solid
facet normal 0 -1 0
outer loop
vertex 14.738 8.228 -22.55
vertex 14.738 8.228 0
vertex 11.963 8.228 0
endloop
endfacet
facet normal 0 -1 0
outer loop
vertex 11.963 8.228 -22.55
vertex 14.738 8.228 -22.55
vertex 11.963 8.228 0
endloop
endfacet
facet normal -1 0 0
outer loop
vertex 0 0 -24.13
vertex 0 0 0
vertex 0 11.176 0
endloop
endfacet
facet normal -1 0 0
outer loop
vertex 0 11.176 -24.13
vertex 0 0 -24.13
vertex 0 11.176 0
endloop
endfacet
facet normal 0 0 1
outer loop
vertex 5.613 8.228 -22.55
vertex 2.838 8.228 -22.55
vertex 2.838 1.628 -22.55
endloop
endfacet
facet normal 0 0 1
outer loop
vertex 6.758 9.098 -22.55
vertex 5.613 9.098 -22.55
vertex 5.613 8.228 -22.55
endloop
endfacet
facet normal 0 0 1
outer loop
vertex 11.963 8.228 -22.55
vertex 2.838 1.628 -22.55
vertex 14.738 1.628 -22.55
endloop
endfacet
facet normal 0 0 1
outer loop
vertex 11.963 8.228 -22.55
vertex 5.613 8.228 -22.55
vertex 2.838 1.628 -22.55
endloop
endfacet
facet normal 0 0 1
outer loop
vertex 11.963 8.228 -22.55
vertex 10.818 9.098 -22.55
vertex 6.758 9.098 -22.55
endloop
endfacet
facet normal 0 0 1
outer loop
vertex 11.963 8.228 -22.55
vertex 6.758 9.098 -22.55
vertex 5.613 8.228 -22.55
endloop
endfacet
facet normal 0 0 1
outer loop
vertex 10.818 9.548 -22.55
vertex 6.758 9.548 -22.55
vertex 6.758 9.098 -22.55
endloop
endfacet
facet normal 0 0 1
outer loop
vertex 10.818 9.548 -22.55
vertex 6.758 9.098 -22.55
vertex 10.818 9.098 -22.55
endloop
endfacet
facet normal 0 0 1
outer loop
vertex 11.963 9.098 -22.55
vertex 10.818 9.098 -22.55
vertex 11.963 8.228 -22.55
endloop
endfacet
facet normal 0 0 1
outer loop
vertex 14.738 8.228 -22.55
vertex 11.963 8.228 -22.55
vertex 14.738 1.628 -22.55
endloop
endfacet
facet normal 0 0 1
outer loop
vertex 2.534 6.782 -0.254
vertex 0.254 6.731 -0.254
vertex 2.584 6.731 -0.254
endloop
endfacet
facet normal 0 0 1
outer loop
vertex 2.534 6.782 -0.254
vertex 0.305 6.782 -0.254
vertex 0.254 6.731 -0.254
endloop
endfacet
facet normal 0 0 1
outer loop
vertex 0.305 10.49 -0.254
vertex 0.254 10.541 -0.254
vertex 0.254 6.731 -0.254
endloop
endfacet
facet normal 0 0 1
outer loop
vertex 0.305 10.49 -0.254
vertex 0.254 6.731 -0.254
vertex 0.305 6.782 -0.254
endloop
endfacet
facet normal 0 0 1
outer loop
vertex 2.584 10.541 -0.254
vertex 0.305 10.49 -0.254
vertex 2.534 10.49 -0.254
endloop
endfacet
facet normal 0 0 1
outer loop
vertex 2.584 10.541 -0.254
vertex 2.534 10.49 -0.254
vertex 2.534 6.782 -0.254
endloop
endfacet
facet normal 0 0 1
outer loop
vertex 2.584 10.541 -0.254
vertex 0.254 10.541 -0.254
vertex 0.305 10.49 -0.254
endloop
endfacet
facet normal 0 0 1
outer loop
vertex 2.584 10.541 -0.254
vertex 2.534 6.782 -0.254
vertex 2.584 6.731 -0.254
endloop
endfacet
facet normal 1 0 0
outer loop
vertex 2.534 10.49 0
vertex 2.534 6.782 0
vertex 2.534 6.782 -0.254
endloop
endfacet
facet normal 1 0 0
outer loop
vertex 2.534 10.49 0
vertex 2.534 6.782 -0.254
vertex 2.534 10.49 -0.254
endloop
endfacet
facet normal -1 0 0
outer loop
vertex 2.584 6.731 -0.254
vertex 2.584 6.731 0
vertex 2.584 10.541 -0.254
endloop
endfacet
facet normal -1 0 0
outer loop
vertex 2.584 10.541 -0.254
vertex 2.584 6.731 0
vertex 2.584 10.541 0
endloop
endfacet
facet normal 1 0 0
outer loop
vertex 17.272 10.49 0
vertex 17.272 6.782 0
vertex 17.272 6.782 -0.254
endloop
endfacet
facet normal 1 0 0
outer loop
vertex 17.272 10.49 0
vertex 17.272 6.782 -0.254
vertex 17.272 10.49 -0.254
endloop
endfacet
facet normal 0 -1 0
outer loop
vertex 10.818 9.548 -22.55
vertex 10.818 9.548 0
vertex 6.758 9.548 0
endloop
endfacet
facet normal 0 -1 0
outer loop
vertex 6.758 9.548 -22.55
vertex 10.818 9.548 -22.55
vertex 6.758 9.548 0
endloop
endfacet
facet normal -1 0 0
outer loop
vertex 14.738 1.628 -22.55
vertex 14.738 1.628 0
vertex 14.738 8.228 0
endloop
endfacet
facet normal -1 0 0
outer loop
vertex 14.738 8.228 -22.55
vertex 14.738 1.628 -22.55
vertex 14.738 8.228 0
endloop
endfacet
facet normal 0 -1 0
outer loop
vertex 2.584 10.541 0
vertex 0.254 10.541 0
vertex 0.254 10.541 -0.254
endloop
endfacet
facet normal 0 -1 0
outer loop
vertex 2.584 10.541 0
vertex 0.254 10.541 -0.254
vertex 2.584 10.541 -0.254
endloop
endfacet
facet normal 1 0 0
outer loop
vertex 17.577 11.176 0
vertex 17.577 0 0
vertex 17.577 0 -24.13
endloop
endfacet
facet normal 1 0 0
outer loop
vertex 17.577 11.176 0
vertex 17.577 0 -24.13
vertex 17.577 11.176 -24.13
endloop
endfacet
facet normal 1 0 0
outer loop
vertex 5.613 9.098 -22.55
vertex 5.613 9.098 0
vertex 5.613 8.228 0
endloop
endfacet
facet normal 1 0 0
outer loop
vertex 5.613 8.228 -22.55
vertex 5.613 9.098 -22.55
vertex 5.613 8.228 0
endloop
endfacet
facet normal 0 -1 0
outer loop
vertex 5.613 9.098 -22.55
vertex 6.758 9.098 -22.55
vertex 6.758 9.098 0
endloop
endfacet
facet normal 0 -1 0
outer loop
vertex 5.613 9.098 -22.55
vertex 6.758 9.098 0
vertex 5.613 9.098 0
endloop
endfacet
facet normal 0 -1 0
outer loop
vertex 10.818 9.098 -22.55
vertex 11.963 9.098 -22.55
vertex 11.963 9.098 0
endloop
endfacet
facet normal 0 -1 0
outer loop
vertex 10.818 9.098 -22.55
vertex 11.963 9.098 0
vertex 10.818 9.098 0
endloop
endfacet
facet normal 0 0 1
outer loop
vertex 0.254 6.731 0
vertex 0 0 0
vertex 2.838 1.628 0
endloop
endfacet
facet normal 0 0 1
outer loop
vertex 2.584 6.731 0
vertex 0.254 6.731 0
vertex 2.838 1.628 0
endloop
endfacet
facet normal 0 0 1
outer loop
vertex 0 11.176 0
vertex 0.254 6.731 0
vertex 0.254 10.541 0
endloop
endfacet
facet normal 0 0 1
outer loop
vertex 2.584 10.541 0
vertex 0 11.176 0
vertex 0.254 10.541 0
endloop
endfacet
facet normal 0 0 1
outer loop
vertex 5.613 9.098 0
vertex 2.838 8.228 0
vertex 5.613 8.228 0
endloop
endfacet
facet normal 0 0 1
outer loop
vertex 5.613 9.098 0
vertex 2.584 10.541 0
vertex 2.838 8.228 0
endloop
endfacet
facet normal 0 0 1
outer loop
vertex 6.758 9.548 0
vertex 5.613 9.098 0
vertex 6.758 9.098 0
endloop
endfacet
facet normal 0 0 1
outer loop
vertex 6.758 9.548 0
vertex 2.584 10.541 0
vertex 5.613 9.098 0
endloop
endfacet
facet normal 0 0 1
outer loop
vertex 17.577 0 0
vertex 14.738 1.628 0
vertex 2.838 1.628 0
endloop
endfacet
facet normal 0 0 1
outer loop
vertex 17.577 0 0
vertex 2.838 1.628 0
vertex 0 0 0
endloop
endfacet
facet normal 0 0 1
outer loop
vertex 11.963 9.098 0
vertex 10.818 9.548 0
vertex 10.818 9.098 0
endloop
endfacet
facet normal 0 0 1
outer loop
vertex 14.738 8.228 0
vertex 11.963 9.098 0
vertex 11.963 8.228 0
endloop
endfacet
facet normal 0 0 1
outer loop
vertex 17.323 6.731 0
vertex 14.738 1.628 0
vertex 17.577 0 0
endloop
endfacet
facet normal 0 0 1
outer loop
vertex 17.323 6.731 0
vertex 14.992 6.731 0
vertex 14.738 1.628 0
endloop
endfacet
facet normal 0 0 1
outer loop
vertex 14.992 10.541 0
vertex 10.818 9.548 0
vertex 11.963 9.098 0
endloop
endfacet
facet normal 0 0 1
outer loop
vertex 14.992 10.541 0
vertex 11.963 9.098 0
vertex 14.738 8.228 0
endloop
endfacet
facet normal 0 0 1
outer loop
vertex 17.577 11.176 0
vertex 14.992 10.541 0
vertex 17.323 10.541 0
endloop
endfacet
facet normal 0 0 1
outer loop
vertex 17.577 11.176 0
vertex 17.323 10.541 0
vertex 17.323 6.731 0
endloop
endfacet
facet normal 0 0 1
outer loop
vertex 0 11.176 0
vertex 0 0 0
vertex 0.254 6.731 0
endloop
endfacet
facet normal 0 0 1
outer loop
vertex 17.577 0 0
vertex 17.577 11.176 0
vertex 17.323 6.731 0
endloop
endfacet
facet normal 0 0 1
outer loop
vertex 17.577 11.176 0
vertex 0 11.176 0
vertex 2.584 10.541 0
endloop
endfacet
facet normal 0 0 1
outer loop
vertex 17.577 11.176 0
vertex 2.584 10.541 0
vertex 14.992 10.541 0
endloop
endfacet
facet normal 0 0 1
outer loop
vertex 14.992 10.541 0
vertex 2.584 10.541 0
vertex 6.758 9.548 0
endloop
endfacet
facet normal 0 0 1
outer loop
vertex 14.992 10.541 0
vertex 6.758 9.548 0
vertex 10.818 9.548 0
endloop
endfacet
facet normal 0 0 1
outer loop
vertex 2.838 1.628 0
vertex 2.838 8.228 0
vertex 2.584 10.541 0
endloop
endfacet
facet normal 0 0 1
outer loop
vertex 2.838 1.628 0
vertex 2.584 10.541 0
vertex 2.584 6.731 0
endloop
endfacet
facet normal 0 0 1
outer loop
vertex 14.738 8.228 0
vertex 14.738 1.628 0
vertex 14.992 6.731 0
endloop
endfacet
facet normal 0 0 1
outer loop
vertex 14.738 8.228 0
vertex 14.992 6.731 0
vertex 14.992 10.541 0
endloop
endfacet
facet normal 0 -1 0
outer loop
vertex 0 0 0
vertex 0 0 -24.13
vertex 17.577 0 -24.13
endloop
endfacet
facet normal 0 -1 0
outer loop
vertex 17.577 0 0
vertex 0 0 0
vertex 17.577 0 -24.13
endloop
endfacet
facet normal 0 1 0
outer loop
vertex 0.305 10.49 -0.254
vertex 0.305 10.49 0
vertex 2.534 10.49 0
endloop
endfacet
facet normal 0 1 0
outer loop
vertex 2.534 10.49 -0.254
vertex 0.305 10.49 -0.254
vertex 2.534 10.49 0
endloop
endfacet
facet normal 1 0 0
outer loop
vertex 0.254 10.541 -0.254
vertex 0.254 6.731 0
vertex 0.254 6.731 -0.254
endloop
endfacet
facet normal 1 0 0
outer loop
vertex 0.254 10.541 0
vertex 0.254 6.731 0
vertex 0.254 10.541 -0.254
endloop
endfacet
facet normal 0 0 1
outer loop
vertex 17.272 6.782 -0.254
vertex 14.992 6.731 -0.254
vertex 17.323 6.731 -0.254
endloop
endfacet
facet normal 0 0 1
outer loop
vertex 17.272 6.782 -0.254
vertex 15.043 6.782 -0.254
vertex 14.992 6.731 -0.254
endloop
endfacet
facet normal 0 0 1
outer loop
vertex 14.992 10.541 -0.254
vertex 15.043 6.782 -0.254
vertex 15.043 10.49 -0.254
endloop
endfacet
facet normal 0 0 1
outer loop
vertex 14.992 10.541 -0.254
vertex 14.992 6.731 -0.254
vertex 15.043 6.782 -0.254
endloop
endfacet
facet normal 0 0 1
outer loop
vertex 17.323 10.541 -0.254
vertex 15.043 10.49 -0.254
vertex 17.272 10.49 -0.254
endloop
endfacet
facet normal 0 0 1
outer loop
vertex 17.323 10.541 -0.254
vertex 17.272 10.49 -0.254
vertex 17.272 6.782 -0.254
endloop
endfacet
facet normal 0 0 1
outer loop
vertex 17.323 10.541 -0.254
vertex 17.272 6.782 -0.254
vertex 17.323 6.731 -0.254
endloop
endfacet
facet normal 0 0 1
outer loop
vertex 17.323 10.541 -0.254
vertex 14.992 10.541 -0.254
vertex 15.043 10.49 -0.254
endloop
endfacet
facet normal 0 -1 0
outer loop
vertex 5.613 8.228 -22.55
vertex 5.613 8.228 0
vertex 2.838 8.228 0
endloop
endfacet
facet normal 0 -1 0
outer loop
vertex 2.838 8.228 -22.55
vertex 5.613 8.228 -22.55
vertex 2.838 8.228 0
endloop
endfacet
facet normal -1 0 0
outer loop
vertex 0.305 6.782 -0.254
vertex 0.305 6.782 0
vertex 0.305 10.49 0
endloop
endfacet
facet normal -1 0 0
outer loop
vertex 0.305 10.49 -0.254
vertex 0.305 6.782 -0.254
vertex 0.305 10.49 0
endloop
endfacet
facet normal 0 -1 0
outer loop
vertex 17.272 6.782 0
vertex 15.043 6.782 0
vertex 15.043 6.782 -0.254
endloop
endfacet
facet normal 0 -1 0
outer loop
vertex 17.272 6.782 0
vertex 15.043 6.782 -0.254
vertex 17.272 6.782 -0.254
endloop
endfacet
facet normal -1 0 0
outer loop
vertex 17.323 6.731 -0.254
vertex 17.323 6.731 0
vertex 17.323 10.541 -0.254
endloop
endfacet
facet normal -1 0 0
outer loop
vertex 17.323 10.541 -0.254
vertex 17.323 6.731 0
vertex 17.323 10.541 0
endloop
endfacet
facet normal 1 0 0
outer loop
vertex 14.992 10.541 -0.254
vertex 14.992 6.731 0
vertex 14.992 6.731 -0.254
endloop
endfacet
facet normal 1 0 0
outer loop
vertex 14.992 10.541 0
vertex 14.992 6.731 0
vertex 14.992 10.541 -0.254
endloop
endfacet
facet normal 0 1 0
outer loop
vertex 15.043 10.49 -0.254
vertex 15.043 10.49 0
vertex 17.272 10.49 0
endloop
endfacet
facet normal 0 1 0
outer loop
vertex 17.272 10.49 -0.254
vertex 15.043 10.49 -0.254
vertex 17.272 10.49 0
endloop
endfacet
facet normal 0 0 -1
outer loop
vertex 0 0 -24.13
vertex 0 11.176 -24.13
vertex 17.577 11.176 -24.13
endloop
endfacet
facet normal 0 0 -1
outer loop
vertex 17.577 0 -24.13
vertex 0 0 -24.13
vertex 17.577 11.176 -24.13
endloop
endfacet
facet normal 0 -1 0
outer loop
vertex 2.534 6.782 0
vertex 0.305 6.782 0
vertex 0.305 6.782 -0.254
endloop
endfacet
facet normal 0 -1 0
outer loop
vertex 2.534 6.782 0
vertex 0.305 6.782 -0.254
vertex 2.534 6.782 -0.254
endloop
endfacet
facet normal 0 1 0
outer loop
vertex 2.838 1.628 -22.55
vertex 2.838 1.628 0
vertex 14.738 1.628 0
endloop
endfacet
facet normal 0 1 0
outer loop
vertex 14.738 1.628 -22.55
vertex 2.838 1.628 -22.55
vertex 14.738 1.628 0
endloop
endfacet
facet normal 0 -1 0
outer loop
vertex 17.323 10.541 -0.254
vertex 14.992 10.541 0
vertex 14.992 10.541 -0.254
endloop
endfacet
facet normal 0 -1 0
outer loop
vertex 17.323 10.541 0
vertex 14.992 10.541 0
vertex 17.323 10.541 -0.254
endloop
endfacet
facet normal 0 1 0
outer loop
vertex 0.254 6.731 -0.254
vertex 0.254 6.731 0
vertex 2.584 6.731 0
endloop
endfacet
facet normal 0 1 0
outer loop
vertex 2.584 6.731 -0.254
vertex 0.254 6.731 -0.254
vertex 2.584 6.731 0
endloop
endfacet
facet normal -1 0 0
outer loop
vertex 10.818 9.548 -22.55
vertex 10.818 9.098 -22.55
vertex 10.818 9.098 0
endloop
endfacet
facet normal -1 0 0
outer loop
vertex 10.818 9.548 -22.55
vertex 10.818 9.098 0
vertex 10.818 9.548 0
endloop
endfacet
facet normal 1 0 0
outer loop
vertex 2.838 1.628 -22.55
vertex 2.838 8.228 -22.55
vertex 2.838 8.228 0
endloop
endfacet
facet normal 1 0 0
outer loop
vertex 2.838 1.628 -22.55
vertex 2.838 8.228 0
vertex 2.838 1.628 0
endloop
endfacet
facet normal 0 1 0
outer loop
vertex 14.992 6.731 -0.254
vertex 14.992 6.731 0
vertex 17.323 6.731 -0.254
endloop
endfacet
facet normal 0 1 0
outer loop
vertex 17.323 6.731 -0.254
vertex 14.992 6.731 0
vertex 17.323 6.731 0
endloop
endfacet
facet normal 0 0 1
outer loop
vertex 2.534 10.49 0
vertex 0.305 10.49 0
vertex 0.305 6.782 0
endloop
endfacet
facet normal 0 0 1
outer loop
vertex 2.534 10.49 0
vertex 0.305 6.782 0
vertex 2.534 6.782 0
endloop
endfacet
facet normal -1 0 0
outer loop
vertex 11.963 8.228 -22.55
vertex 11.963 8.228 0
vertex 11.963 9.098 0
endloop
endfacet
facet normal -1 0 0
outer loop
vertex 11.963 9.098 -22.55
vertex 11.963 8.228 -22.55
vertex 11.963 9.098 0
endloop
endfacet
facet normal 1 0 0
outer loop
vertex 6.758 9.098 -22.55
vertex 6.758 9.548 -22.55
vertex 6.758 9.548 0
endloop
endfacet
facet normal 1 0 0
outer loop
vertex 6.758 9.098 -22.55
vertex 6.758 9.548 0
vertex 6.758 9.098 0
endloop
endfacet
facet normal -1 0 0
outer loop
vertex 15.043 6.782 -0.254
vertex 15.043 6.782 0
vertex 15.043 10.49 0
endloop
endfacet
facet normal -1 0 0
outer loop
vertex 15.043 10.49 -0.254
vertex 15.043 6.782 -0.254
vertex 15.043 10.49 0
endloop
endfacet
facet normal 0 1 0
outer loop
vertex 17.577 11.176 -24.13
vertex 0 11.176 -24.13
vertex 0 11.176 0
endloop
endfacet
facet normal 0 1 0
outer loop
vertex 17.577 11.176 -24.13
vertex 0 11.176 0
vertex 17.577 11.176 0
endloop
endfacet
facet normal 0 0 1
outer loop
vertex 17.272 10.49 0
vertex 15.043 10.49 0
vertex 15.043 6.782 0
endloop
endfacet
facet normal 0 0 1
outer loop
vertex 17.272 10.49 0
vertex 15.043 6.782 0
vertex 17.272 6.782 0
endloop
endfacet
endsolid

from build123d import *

# Parameters (mm, degrees)
SKETCH1_W           = 17.5768
SKETCH1_H           = 11.176
BOSS_EXTRUDE1_DEPTH = 24.13
CUT_EXTRUDE1_DEPTH  = 22.55
SKETCH3_W           = 2.3304
SKETCH3_H           = 3.81
SKETCH3_W_2         = 2.2288
SKETCH3_H_2         = 3.7084
CUT_EXTRUDE2_DEPTH  = 0.254


with BuildPart() as part:
    # Sketch1 → Boss-Extrude1 (new body)
    with BuildSketch(Plane.XY):
        with Locations((8.7884, 5.588)):
            Rectangle(SKETCH1_W, SKETCH1_H)
    extrude(amount=-BOSS_EXTRUDE1_DEPTH)

    # Sketch2 → Cut-Extrude1 (cut)
    with BuildSketch(Plane.XY):
        Polygon((2.8384, 1.628), (14.7384, 1.628), (14.7384, 8.228), (11.9634, 8.228), (11.9634, 9.098), (10.8184, 9.098), (10.8184, 9.548), (6.7584, 9.548), (6.7584, 9.098), (5.6134, 9.098), (5.6134, 8.228), (2.8384, 8.228), align=None)
    extrude(amount=-CUT_EXTRUDE1_DEPTH, mode=Mode.SUBTRACT)

    # Sketch3 → Cut-Extrude2 (cut)
    with BuildSketch(Plane.XY):
        with Locations((1.4192, 8.636)):
            Rectangle(SKETCH3_W, SKETCH3_H)
        with Locations((1.4192, 8.636)):
            Rectangle(SKETCH3_W_2, SKETCH3_H_2, mode=Mode.SUBTRACT)
        with Locations((16.1576, 8.636)):
            Rectangle(SKETCH3_W, SKETCH3_H)
        with Locations((16.1576, 8.636)):
            Rectangle(SKETCH3_W_2, SKETCH3_H_2, mode=Mode.SUBTRACT)
    extrude(amount=-CUT_EXTRUDE2_DEPTH, mode=Mode.SUBTRACT)


solid = part.part
